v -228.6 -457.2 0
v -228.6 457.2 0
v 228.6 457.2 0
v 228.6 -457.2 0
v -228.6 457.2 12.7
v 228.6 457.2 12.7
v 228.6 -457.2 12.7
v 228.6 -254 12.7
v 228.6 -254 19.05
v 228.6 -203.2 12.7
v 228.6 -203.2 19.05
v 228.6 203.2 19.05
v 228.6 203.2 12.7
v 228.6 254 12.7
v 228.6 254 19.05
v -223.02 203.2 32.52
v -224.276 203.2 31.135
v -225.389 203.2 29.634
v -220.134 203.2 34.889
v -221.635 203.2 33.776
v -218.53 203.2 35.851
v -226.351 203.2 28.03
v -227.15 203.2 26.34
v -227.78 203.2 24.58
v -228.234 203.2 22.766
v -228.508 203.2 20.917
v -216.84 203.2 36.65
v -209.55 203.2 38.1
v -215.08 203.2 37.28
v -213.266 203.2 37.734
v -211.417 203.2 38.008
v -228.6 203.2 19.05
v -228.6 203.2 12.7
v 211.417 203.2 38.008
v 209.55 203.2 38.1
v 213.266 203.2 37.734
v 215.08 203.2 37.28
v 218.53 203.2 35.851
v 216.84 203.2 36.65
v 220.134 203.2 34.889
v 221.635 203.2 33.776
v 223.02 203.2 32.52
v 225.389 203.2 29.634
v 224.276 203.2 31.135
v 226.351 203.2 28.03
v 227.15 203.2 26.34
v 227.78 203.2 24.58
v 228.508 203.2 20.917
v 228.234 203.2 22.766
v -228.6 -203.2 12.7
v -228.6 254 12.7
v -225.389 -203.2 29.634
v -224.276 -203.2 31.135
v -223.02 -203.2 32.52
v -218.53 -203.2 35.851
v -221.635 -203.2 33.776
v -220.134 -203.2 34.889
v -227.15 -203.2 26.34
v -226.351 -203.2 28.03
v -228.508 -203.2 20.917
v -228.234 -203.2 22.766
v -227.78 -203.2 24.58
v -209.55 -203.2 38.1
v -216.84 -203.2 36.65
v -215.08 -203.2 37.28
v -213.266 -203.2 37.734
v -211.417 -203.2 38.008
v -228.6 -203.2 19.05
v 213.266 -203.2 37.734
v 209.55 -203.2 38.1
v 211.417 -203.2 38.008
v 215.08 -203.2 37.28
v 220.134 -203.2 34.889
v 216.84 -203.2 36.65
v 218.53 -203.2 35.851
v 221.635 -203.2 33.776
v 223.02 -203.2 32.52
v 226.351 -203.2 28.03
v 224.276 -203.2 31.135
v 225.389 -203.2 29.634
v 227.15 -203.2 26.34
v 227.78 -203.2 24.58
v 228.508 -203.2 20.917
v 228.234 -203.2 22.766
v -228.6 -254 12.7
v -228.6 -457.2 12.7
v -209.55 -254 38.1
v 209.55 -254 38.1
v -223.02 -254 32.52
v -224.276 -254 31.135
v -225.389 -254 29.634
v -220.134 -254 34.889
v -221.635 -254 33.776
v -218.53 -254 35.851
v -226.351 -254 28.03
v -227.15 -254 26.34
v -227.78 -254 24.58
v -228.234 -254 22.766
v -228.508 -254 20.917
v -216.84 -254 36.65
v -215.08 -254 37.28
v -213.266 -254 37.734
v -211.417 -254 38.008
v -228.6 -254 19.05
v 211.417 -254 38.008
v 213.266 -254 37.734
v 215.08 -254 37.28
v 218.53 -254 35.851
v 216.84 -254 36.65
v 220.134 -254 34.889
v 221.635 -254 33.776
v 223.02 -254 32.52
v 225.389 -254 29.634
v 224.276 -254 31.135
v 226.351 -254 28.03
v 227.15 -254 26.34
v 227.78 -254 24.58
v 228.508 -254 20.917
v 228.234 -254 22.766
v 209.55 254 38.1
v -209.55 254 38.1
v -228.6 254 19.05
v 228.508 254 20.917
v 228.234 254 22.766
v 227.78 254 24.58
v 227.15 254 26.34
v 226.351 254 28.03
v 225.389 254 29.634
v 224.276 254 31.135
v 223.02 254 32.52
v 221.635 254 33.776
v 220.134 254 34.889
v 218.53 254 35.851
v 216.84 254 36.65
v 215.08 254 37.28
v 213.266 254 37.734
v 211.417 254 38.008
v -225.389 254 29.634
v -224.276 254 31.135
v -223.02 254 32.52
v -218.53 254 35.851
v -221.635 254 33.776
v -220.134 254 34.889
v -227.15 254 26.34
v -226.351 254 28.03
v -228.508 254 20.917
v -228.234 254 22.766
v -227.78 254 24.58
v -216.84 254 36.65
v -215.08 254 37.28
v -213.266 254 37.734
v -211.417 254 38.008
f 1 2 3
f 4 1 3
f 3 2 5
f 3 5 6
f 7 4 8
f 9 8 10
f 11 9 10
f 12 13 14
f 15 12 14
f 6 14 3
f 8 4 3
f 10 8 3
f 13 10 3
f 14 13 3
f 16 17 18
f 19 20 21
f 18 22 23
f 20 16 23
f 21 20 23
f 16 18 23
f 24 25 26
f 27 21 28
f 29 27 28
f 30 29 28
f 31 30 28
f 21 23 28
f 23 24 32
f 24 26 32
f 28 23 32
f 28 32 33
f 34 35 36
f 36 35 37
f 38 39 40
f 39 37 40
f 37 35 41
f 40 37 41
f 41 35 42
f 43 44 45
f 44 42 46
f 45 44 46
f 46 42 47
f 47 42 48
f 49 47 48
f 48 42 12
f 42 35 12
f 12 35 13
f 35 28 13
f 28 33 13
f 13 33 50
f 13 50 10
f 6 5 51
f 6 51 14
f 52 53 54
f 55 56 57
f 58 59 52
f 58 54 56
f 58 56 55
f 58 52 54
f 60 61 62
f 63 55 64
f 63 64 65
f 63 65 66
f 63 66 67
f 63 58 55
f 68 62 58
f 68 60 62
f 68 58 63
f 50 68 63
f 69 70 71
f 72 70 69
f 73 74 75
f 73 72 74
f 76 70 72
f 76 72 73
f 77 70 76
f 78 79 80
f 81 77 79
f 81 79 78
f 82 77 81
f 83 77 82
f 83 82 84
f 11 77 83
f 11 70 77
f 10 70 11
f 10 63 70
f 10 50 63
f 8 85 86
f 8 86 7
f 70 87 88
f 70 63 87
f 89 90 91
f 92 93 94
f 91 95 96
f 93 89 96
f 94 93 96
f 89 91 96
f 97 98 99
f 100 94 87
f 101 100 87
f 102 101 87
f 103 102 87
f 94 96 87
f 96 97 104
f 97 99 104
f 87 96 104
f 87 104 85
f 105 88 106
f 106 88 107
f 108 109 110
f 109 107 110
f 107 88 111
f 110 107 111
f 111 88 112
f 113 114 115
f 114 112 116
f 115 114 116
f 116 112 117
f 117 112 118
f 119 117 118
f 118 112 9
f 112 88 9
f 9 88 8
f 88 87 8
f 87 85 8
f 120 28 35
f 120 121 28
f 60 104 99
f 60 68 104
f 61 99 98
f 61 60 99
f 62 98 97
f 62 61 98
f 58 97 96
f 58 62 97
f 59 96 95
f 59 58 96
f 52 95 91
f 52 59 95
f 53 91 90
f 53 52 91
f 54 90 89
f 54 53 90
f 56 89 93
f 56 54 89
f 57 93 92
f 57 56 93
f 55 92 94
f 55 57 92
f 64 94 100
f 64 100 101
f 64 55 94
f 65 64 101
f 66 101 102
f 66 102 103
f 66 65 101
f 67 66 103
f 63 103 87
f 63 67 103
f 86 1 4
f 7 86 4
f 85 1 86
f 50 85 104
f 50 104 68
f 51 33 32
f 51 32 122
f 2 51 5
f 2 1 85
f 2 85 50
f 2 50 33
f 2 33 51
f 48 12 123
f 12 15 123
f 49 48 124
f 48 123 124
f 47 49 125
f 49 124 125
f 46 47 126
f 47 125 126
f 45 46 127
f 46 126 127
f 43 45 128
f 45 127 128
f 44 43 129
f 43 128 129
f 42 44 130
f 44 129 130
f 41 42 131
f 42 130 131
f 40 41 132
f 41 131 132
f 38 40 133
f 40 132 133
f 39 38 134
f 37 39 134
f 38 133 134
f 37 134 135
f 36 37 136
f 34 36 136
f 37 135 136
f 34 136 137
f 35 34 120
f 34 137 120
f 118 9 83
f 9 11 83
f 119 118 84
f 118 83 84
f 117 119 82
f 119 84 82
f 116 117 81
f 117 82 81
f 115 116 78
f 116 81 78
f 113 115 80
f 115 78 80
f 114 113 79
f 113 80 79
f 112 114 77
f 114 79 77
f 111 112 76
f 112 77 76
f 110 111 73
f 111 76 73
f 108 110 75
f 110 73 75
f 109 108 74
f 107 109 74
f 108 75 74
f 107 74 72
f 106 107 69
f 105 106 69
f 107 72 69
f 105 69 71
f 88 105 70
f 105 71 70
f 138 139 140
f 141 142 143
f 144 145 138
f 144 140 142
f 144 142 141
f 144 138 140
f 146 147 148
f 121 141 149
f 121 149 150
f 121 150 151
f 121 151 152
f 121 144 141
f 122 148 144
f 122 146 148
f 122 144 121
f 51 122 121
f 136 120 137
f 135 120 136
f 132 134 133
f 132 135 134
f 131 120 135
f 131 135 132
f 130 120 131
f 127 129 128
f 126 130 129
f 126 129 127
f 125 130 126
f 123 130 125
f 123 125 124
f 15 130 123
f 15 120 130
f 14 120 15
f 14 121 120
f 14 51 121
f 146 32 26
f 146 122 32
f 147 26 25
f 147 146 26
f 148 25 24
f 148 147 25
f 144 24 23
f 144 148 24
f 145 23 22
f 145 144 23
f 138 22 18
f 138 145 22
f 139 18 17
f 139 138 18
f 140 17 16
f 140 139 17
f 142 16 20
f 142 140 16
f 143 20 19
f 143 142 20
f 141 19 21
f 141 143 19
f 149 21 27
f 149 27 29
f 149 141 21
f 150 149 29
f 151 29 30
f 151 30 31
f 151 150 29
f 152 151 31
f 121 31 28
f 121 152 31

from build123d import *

# Parameters (mm, degrees)
F0_W     = 457.2
F0_H     = 914.4
F1_DEPTH = 12.7
F2_W     = 457.2
F2_H     = 50.8
F3_DEPTH = 25.4
F4_R     = 19.05


with BuildPart() as f1:
    # F0 (on Top) → F1 (new body)
    with BuildSketch(Plane.XY):
        Rectangle(F0_W, F0_H)
    extrude(amount=F1_DEPTH)

    # F2 (on face) → F3 (join)
    with BuildSketch(Plane.XY.offset(12.7)):
        with Locations((0, -228.6)):
            Rectangle(F2_W, F2_H)
        with Locations((0, 228.6)):
            Rectangle(F2_W, F2_H)
    extrude(amount=F3_DEPTH)

    # F4
    f4_edges = [f1.edges().sort_by_distance(p)[0] for p in [
        (-228.6, -228.6, 38.1),
        (228.6, -228.6, 38.1),
        (228.6, 228.6, 38.1),
        (-228.6, 228.6, 38.1),
    ]]
    fillet(f4_edges, radius=F4_R)


solid = f1.part
